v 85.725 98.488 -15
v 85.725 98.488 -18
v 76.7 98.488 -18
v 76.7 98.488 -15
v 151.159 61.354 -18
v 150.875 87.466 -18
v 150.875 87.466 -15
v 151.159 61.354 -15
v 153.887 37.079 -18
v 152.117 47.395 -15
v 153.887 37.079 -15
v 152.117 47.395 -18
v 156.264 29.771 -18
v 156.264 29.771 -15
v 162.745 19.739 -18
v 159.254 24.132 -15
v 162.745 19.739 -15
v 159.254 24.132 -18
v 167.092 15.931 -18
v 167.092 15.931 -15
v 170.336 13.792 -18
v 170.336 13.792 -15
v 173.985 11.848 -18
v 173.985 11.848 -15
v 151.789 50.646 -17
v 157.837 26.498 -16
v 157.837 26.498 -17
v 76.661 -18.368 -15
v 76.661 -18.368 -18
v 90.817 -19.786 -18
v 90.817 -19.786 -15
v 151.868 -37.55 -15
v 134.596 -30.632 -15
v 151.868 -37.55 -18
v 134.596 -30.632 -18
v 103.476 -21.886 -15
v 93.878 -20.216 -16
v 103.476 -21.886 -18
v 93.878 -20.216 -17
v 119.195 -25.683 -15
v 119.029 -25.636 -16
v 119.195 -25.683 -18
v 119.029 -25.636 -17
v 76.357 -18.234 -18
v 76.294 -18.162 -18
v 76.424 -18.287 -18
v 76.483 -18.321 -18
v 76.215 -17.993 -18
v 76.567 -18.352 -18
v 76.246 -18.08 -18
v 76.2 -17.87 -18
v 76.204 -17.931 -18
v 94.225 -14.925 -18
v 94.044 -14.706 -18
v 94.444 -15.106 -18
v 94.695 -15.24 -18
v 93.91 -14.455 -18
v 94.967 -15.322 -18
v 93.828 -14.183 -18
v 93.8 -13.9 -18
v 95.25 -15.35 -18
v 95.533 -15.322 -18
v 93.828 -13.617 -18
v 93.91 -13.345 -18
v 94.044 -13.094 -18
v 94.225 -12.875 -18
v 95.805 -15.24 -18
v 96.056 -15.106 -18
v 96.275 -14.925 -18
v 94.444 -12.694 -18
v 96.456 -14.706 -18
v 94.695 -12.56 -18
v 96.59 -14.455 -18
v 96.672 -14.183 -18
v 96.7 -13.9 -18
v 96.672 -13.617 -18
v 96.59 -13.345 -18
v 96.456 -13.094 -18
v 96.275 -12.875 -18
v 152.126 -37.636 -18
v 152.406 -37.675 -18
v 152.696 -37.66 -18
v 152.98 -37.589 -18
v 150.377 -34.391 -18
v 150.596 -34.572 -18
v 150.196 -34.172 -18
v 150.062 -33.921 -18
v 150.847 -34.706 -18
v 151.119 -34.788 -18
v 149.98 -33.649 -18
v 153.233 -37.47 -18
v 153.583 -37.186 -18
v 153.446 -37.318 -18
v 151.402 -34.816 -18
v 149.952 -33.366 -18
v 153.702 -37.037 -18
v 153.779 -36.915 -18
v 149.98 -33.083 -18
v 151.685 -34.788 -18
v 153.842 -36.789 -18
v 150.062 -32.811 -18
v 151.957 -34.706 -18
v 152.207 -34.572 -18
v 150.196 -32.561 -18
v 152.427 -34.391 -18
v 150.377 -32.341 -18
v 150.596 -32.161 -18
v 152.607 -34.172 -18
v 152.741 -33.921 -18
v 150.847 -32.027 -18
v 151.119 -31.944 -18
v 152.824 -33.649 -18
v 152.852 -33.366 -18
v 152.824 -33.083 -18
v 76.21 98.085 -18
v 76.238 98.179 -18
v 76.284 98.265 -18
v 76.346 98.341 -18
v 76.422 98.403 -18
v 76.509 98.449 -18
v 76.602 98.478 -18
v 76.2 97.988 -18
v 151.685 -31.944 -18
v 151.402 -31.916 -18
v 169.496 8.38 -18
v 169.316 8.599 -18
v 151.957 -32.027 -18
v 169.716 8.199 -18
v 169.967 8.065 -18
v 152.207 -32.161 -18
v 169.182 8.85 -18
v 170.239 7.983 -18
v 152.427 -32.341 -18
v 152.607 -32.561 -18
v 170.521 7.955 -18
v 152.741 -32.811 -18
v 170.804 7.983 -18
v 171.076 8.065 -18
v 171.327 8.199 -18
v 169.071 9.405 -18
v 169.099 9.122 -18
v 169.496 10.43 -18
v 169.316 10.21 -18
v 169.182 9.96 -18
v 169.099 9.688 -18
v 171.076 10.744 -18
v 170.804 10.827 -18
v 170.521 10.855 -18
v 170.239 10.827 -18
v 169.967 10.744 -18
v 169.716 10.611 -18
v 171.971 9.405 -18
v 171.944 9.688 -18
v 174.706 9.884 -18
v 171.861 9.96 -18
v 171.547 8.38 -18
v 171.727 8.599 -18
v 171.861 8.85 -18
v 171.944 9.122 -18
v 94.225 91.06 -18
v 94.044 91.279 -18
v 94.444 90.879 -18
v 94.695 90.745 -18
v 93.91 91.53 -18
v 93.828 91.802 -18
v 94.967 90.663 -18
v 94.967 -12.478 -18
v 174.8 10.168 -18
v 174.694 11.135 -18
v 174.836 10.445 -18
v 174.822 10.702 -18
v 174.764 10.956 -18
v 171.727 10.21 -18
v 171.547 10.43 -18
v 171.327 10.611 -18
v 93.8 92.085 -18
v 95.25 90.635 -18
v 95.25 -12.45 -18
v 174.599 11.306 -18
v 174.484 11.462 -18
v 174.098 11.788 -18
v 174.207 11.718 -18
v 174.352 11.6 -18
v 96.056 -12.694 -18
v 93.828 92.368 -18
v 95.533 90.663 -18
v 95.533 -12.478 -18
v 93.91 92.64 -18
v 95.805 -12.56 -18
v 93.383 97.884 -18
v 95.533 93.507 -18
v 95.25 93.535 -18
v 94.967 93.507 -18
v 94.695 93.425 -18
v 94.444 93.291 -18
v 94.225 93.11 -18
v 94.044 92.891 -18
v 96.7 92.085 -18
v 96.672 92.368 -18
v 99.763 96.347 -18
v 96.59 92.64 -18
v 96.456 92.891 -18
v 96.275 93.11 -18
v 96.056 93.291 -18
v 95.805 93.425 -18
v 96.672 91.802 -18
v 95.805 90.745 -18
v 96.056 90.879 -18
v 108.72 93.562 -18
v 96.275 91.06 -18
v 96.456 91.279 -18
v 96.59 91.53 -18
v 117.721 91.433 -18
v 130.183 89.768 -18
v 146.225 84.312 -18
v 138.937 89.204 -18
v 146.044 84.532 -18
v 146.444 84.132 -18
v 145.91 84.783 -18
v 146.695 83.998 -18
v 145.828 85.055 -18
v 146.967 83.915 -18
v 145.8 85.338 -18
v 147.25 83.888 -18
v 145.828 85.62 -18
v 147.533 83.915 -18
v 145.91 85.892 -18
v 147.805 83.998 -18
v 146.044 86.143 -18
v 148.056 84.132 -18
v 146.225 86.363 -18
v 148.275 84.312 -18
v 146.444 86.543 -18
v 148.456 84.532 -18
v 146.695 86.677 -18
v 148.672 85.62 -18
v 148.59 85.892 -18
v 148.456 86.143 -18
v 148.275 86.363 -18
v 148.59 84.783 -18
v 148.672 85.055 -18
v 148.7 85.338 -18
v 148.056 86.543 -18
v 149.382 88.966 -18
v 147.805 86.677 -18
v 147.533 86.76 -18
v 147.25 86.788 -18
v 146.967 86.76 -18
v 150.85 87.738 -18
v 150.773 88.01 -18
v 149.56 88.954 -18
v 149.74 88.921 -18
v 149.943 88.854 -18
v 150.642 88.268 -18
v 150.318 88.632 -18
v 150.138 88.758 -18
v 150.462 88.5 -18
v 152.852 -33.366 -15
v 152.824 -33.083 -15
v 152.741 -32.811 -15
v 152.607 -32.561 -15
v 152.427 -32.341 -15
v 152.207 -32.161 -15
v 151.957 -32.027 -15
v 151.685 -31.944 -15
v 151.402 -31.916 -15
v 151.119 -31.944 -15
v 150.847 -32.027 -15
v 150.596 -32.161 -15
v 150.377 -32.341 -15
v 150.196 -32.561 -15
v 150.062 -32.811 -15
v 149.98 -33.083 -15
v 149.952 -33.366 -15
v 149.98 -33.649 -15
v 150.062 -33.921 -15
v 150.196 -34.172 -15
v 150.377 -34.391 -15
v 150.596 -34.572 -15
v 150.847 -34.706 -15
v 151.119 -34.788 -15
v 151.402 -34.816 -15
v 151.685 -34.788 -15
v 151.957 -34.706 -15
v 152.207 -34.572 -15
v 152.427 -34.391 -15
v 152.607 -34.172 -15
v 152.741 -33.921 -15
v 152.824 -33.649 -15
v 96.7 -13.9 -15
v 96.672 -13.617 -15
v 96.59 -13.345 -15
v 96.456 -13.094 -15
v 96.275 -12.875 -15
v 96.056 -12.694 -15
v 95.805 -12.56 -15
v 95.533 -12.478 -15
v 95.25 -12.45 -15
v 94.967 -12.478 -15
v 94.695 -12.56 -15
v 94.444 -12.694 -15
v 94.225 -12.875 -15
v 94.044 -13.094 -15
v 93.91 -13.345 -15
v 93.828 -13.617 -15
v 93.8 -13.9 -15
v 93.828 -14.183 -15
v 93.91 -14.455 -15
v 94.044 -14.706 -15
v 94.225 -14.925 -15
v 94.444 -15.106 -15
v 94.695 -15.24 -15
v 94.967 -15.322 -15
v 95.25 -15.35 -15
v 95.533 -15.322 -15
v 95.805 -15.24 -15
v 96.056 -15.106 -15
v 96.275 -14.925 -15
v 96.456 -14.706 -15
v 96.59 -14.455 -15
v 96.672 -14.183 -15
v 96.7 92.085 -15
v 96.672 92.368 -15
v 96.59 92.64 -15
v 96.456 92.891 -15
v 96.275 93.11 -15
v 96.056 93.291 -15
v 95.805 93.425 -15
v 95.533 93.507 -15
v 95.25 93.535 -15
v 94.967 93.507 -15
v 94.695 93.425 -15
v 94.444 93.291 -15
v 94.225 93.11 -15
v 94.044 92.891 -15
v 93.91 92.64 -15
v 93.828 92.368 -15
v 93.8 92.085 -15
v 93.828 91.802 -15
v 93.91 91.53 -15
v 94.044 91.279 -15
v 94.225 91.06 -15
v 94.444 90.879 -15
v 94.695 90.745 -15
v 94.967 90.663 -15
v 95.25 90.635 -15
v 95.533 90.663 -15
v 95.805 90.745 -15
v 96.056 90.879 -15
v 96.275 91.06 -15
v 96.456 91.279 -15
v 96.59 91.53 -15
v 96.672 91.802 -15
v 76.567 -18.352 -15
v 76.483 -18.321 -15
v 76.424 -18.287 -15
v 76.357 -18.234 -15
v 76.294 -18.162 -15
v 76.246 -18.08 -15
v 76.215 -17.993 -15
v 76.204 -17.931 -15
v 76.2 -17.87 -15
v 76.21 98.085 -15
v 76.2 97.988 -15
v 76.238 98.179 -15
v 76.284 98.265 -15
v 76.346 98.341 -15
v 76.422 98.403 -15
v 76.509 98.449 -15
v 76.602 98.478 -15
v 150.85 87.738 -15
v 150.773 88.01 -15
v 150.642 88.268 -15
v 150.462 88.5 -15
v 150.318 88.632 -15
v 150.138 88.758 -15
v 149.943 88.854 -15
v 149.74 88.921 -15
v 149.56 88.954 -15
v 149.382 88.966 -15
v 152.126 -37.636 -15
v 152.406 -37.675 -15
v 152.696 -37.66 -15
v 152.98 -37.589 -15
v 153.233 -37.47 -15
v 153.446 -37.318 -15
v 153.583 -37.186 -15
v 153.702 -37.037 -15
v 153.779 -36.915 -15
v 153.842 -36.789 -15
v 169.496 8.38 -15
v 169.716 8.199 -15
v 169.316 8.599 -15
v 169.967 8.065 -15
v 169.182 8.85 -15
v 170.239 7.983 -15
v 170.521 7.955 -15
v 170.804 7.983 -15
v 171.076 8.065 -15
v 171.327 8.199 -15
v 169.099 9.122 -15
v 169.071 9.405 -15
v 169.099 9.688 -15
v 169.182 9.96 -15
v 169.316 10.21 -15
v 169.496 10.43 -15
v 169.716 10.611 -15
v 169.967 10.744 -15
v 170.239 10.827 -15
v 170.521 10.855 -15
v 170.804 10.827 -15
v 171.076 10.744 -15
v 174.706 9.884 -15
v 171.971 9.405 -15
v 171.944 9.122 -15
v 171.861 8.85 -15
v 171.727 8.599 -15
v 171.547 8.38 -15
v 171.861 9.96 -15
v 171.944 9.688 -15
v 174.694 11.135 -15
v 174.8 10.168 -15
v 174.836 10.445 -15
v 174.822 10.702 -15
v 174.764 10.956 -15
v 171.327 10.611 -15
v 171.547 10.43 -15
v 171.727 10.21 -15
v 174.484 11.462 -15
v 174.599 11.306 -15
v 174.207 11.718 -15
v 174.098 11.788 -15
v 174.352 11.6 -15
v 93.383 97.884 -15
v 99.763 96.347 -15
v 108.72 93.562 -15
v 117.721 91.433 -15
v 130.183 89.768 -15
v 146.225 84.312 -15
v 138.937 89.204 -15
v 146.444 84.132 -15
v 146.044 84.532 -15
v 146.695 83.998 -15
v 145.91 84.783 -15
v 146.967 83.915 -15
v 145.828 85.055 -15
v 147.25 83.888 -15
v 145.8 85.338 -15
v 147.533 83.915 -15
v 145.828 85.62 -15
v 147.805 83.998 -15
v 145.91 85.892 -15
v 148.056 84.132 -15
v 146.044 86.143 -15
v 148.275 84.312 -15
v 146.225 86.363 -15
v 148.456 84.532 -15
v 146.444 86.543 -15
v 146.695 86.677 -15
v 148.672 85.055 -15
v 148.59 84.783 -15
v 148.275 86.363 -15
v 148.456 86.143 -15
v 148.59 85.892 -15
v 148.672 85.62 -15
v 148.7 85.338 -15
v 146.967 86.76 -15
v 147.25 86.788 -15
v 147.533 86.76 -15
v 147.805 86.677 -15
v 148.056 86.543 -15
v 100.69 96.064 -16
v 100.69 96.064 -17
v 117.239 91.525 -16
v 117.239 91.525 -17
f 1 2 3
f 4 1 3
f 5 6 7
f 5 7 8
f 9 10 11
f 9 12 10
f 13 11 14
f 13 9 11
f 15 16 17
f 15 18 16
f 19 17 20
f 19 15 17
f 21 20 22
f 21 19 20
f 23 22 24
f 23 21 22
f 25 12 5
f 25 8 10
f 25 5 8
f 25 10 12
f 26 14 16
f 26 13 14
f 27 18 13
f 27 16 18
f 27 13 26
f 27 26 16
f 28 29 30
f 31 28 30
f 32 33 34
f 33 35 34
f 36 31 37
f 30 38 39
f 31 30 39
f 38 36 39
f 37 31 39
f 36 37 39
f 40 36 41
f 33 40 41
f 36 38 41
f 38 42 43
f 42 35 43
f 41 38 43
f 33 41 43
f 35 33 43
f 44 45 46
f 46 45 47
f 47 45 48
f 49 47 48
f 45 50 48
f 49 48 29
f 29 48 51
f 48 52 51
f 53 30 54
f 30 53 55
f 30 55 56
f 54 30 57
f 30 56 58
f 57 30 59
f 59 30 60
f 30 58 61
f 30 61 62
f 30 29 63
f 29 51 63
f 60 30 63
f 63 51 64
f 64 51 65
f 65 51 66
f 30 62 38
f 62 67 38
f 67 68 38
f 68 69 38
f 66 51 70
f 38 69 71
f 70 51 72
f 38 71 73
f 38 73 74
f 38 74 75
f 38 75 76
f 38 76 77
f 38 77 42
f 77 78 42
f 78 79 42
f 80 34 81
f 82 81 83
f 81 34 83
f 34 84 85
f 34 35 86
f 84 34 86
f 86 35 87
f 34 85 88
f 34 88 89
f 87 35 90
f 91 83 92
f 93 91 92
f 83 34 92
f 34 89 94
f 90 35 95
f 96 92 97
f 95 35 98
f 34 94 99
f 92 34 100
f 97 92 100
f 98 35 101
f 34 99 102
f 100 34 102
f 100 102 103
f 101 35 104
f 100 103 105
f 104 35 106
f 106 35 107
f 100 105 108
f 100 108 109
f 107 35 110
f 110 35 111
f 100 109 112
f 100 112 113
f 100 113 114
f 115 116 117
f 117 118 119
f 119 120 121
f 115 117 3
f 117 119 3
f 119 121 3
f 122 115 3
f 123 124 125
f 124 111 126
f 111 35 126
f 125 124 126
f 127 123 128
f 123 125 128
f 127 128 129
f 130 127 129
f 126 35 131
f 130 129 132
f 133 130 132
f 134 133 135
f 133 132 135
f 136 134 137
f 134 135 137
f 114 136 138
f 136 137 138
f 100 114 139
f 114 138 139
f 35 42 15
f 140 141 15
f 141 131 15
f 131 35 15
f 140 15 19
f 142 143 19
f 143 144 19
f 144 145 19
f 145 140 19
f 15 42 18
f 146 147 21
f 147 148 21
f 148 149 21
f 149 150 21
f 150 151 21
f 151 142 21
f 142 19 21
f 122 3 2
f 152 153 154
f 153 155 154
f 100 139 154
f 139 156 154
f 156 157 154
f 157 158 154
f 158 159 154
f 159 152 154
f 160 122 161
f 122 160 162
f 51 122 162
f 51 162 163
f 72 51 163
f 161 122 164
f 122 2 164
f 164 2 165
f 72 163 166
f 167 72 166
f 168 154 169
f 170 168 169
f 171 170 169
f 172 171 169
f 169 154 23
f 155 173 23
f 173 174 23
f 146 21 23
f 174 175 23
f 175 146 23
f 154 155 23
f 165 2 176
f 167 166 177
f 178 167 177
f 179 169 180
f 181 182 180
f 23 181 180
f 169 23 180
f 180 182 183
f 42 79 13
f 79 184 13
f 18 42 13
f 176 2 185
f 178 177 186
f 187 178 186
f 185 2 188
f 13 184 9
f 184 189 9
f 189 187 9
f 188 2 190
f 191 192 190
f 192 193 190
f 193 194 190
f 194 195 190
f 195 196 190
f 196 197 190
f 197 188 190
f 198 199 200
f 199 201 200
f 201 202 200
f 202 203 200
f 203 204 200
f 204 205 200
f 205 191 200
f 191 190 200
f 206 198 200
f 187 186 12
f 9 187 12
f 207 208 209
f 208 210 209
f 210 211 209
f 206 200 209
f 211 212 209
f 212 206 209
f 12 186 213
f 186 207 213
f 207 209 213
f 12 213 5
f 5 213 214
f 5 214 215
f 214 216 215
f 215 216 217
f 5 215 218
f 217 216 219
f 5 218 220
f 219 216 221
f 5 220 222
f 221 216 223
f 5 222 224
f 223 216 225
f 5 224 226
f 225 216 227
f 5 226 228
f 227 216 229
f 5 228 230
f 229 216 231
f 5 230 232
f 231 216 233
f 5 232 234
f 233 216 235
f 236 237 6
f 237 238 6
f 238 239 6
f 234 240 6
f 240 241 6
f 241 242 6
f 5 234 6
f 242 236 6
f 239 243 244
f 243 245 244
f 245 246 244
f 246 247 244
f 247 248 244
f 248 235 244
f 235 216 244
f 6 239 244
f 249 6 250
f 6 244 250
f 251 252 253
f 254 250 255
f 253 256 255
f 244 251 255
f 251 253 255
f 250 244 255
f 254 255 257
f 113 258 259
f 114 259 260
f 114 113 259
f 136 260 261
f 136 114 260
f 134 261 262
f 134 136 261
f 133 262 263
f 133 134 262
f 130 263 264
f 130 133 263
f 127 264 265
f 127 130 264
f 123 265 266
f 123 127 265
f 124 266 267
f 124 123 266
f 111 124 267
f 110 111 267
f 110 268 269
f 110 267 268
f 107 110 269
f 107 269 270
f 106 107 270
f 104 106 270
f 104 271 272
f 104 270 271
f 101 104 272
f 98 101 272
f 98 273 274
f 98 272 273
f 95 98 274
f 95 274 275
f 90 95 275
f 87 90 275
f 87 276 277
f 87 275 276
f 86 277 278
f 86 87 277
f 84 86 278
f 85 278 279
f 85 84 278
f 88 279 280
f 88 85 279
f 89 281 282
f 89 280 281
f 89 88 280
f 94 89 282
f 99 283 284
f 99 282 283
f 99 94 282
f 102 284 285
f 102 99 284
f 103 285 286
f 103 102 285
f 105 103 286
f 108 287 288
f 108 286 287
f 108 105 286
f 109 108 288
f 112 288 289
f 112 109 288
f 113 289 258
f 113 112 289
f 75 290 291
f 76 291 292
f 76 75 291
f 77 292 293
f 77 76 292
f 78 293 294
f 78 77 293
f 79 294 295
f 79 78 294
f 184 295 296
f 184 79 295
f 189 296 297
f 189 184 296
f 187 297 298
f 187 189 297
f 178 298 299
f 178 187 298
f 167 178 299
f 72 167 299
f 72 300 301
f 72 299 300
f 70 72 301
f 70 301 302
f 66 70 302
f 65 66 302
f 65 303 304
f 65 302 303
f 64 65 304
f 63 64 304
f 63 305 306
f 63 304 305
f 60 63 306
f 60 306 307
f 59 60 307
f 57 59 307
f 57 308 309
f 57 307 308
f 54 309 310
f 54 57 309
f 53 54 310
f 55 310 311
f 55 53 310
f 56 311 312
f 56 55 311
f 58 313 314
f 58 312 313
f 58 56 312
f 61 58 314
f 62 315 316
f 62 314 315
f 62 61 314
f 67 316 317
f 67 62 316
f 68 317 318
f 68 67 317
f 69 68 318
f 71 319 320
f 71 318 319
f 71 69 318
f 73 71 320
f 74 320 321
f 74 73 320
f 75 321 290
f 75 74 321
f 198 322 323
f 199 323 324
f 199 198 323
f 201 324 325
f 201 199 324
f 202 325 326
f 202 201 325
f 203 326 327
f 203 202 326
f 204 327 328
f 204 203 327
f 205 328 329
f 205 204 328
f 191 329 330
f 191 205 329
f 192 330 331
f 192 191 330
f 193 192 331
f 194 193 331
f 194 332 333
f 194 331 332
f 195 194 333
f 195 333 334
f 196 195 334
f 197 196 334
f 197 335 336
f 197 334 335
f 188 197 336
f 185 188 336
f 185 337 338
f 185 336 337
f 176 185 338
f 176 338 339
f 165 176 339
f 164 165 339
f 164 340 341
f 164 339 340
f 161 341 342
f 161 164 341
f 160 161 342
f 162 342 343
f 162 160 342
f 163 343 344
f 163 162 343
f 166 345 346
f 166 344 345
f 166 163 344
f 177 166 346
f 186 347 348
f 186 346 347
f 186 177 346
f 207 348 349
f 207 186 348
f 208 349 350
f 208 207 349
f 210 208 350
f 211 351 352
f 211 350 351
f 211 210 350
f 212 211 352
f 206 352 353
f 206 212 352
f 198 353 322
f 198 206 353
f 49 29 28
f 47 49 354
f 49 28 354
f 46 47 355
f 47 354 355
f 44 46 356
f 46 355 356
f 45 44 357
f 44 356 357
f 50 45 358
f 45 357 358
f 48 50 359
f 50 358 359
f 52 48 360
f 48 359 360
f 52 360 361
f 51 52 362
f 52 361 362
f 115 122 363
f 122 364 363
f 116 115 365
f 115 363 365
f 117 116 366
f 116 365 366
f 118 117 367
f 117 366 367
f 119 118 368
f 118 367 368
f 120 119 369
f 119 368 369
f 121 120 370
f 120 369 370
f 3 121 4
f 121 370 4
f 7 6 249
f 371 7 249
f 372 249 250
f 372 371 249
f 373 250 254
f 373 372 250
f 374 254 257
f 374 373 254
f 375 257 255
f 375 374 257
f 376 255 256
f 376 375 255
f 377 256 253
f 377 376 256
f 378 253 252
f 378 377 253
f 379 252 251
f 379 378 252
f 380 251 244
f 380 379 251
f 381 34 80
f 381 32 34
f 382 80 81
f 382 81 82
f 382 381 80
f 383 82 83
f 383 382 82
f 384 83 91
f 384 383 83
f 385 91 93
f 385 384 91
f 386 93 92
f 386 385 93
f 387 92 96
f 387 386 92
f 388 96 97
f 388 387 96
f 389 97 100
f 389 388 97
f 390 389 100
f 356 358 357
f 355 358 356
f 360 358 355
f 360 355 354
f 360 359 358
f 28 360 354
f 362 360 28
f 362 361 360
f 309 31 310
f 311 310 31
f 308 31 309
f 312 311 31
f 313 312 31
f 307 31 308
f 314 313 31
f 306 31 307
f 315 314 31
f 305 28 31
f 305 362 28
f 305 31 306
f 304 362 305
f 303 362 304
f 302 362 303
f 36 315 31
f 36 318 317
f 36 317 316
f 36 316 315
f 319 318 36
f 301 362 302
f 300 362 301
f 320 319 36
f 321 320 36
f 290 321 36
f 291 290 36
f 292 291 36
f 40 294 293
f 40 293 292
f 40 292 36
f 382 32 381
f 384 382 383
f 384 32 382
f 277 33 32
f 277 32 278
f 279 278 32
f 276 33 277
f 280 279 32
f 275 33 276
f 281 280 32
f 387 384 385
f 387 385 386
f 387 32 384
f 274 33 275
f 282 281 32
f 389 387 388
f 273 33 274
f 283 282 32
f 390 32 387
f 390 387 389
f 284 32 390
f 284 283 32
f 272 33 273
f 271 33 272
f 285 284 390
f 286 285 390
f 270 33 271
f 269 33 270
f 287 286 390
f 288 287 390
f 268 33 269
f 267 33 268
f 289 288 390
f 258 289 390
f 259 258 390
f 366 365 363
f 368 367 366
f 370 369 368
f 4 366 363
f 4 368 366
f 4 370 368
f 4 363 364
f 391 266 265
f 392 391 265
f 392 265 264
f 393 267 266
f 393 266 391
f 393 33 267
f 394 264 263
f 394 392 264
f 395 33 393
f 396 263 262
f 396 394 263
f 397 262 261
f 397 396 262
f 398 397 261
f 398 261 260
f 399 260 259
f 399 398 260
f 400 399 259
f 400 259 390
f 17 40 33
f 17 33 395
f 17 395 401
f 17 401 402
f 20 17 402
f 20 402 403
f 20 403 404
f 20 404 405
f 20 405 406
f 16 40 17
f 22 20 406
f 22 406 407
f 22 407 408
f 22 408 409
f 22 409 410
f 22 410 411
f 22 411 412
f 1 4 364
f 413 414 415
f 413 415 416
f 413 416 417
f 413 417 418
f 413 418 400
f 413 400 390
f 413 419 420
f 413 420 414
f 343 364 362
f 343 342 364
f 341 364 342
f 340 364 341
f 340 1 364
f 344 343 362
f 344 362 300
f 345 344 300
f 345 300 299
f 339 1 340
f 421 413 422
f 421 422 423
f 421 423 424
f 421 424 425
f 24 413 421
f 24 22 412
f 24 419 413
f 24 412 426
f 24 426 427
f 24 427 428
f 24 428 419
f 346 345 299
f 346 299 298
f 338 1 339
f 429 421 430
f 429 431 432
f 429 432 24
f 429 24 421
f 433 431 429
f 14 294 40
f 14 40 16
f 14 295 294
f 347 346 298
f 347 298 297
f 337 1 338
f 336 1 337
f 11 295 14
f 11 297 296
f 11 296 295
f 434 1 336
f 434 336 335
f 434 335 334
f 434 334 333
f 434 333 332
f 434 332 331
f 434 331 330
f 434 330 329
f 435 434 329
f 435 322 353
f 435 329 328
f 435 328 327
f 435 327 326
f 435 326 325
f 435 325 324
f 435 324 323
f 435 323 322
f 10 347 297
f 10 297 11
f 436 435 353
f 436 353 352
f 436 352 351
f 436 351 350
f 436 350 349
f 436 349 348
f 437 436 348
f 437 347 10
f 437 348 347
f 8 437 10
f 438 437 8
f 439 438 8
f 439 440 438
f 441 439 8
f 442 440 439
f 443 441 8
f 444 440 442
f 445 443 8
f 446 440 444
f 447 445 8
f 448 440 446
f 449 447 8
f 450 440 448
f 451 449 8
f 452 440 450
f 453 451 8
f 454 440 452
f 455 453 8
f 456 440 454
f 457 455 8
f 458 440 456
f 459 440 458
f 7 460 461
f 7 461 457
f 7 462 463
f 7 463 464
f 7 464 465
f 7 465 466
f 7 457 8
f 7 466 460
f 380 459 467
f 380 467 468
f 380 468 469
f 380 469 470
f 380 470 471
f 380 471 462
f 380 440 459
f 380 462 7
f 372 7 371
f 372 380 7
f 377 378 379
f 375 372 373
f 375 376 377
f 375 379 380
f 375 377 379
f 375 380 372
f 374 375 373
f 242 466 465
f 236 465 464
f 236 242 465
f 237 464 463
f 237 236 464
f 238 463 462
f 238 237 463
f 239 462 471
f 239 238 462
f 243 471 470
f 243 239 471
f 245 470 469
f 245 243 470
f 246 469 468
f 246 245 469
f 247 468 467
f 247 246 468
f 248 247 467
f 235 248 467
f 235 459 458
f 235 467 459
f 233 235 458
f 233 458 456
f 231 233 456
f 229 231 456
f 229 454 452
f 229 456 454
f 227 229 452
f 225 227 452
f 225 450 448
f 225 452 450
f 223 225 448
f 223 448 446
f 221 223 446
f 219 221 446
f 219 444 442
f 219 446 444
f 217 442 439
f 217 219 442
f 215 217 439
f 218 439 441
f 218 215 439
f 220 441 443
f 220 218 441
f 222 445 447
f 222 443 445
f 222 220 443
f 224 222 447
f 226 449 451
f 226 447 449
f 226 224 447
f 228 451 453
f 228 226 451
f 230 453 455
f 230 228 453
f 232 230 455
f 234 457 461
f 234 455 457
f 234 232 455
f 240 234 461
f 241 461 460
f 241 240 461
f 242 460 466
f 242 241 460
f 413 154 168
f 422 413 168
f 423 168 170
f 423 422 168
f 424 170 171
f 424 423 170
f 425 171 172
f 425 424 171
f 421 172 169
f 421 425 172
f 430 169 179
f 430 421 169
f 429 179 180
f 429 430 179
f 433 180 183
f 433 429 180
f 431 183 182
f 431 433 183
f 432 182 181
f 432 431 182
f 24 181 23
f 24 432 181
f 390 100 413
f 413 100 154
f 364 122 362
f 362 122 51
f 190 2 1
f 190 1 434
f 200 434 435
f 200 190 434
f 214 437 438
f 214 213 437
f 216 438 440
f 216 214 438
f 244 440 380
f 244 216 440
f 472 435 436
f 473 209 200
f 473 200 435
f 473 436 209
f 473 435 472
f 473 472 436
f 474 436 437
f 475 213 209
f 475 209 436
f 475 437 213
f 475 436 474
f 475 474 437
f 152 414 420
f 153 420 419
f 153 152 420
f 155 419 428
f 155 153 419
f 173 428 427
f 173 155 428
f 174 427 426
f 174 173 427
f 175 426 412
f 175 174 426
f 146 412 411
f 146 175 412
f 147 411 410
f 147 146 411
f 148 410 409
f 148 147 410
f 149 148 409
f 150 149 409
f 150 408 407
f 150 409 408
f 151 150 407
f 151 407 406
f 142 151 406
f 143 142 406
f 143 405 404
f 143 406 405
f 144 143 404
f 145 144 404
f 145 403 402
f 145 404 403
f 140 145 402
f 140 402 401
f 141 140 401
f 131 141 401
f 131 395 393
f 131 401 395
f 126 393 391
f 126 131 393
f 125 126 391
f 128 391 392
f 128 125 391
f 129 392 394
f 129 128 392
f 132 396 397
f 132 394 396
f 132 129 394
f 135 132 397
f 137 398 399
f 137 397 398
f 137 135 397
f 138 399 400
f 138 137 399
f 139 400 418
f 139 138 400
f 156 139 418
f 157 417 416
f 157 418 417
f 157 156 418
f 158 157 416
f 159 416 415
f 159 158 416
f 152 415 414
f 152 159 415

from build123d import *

# Parameters (mm, degrees)
PAD010_DEPTH    = 3
SKETCH045_R     = 1.45
POCKET015_DEPTH = 30
FILLET008_R     = 1.5
FILLET016_R     = 0.5


with BuildPart() as part:
    # Sketch034 → Pad010 (new body)
    with BuildSketch(Plane.XY):
        with BuildLine():
            add(Edge.make_bspline(
                [(76.2, -18.332251), (89.391212, -19.369368), (115.462334, -21.271145), (153.231854, -38.154949)],
                knots=[0, 0, 0, 0, 1, 1, 1, 1], degree=3))
            Line((153.231854, -38.154949), (175.310198, 11.234895))
            add(Edge.make_bspline(
                [(150.875, 88.9625), (150.875, 42.8625), (150.875, 22.157965), (175.310198, 11.234895)],
                knots=[0, 0, 0, 0, 1, 1, 1, 1], degree=3))
            add(Edge.make_bspline(
                [(85.725, 98.4875), (104.775, 98.4875), (104.775, 88.9625), (150.875, 88.9625)],
                knots=[0, 0, 0, 0, 1, 1, 1, 1], degree=3))
            Line((85.725, 98.4875), (76.2, 98.4875))
            Line((76.2, 98.4875), (76.2, -18.332251))
        make_face()
    extrude(amount=PAD010_DEPTH)

    # Sketch045 → Pocket015 (cut)
    with BuildSketch(Plane.XY):
        with Locations((-4.375, -4.375)):
            Circle(SKETCH045_R)
        with Locations((-4.375, 80.575)):
            Circle(SKETCH045_R)
        with Locations((151.401832, -33.366184)):
            Circle(SKETCH045_R)
        with Locations((170.521433, 9.404873)):
            Circle(SKETCH045_R)
        with Locations((147.25, 85.3375)):
            Circle(SKETCH045_R)
        with Locations((43.25, -13.9)):
            Circle(SKETCH045_R)
        with Locations((57.15, 92.085)):
            Circle(SKETCH045_R)
        with Locations((95.25, 92.085)):
            Circle(SKETCH045_R)
        with Locations((95.25, -13.9)):
            Circle(SKETCH045_R)
    extrude(amount=POCKET015_DEPTH, mode=Mode.SUBTRACT)

    # Fillet008
    fillet008_edges = [part.edges().sort_by_distance(p)[0] for p in [
        (150.875, 88.9625, 1.5),
        (175.310198, 11.234895, 1.5),
        (153.231854, -38.154949, 1.5),
    ]]
    fillet(fillet008_edges, radius=FILLET008_R)

    # Fillet016
    fillet016_edges = [part.edges().sort_by_distance(p)[0] for p in [
        (76.2, 98.4875, 1.5),
        (76.2, -18.332251, 1.5),
    ]]
    fillet(fillet016_edges, radius=FILLET016_R)


with BuildPart() as part_1:
    # Body009 placement: moved
    add(part.part.moved(Location((0, 0, -18))))


solid = part_1.part
